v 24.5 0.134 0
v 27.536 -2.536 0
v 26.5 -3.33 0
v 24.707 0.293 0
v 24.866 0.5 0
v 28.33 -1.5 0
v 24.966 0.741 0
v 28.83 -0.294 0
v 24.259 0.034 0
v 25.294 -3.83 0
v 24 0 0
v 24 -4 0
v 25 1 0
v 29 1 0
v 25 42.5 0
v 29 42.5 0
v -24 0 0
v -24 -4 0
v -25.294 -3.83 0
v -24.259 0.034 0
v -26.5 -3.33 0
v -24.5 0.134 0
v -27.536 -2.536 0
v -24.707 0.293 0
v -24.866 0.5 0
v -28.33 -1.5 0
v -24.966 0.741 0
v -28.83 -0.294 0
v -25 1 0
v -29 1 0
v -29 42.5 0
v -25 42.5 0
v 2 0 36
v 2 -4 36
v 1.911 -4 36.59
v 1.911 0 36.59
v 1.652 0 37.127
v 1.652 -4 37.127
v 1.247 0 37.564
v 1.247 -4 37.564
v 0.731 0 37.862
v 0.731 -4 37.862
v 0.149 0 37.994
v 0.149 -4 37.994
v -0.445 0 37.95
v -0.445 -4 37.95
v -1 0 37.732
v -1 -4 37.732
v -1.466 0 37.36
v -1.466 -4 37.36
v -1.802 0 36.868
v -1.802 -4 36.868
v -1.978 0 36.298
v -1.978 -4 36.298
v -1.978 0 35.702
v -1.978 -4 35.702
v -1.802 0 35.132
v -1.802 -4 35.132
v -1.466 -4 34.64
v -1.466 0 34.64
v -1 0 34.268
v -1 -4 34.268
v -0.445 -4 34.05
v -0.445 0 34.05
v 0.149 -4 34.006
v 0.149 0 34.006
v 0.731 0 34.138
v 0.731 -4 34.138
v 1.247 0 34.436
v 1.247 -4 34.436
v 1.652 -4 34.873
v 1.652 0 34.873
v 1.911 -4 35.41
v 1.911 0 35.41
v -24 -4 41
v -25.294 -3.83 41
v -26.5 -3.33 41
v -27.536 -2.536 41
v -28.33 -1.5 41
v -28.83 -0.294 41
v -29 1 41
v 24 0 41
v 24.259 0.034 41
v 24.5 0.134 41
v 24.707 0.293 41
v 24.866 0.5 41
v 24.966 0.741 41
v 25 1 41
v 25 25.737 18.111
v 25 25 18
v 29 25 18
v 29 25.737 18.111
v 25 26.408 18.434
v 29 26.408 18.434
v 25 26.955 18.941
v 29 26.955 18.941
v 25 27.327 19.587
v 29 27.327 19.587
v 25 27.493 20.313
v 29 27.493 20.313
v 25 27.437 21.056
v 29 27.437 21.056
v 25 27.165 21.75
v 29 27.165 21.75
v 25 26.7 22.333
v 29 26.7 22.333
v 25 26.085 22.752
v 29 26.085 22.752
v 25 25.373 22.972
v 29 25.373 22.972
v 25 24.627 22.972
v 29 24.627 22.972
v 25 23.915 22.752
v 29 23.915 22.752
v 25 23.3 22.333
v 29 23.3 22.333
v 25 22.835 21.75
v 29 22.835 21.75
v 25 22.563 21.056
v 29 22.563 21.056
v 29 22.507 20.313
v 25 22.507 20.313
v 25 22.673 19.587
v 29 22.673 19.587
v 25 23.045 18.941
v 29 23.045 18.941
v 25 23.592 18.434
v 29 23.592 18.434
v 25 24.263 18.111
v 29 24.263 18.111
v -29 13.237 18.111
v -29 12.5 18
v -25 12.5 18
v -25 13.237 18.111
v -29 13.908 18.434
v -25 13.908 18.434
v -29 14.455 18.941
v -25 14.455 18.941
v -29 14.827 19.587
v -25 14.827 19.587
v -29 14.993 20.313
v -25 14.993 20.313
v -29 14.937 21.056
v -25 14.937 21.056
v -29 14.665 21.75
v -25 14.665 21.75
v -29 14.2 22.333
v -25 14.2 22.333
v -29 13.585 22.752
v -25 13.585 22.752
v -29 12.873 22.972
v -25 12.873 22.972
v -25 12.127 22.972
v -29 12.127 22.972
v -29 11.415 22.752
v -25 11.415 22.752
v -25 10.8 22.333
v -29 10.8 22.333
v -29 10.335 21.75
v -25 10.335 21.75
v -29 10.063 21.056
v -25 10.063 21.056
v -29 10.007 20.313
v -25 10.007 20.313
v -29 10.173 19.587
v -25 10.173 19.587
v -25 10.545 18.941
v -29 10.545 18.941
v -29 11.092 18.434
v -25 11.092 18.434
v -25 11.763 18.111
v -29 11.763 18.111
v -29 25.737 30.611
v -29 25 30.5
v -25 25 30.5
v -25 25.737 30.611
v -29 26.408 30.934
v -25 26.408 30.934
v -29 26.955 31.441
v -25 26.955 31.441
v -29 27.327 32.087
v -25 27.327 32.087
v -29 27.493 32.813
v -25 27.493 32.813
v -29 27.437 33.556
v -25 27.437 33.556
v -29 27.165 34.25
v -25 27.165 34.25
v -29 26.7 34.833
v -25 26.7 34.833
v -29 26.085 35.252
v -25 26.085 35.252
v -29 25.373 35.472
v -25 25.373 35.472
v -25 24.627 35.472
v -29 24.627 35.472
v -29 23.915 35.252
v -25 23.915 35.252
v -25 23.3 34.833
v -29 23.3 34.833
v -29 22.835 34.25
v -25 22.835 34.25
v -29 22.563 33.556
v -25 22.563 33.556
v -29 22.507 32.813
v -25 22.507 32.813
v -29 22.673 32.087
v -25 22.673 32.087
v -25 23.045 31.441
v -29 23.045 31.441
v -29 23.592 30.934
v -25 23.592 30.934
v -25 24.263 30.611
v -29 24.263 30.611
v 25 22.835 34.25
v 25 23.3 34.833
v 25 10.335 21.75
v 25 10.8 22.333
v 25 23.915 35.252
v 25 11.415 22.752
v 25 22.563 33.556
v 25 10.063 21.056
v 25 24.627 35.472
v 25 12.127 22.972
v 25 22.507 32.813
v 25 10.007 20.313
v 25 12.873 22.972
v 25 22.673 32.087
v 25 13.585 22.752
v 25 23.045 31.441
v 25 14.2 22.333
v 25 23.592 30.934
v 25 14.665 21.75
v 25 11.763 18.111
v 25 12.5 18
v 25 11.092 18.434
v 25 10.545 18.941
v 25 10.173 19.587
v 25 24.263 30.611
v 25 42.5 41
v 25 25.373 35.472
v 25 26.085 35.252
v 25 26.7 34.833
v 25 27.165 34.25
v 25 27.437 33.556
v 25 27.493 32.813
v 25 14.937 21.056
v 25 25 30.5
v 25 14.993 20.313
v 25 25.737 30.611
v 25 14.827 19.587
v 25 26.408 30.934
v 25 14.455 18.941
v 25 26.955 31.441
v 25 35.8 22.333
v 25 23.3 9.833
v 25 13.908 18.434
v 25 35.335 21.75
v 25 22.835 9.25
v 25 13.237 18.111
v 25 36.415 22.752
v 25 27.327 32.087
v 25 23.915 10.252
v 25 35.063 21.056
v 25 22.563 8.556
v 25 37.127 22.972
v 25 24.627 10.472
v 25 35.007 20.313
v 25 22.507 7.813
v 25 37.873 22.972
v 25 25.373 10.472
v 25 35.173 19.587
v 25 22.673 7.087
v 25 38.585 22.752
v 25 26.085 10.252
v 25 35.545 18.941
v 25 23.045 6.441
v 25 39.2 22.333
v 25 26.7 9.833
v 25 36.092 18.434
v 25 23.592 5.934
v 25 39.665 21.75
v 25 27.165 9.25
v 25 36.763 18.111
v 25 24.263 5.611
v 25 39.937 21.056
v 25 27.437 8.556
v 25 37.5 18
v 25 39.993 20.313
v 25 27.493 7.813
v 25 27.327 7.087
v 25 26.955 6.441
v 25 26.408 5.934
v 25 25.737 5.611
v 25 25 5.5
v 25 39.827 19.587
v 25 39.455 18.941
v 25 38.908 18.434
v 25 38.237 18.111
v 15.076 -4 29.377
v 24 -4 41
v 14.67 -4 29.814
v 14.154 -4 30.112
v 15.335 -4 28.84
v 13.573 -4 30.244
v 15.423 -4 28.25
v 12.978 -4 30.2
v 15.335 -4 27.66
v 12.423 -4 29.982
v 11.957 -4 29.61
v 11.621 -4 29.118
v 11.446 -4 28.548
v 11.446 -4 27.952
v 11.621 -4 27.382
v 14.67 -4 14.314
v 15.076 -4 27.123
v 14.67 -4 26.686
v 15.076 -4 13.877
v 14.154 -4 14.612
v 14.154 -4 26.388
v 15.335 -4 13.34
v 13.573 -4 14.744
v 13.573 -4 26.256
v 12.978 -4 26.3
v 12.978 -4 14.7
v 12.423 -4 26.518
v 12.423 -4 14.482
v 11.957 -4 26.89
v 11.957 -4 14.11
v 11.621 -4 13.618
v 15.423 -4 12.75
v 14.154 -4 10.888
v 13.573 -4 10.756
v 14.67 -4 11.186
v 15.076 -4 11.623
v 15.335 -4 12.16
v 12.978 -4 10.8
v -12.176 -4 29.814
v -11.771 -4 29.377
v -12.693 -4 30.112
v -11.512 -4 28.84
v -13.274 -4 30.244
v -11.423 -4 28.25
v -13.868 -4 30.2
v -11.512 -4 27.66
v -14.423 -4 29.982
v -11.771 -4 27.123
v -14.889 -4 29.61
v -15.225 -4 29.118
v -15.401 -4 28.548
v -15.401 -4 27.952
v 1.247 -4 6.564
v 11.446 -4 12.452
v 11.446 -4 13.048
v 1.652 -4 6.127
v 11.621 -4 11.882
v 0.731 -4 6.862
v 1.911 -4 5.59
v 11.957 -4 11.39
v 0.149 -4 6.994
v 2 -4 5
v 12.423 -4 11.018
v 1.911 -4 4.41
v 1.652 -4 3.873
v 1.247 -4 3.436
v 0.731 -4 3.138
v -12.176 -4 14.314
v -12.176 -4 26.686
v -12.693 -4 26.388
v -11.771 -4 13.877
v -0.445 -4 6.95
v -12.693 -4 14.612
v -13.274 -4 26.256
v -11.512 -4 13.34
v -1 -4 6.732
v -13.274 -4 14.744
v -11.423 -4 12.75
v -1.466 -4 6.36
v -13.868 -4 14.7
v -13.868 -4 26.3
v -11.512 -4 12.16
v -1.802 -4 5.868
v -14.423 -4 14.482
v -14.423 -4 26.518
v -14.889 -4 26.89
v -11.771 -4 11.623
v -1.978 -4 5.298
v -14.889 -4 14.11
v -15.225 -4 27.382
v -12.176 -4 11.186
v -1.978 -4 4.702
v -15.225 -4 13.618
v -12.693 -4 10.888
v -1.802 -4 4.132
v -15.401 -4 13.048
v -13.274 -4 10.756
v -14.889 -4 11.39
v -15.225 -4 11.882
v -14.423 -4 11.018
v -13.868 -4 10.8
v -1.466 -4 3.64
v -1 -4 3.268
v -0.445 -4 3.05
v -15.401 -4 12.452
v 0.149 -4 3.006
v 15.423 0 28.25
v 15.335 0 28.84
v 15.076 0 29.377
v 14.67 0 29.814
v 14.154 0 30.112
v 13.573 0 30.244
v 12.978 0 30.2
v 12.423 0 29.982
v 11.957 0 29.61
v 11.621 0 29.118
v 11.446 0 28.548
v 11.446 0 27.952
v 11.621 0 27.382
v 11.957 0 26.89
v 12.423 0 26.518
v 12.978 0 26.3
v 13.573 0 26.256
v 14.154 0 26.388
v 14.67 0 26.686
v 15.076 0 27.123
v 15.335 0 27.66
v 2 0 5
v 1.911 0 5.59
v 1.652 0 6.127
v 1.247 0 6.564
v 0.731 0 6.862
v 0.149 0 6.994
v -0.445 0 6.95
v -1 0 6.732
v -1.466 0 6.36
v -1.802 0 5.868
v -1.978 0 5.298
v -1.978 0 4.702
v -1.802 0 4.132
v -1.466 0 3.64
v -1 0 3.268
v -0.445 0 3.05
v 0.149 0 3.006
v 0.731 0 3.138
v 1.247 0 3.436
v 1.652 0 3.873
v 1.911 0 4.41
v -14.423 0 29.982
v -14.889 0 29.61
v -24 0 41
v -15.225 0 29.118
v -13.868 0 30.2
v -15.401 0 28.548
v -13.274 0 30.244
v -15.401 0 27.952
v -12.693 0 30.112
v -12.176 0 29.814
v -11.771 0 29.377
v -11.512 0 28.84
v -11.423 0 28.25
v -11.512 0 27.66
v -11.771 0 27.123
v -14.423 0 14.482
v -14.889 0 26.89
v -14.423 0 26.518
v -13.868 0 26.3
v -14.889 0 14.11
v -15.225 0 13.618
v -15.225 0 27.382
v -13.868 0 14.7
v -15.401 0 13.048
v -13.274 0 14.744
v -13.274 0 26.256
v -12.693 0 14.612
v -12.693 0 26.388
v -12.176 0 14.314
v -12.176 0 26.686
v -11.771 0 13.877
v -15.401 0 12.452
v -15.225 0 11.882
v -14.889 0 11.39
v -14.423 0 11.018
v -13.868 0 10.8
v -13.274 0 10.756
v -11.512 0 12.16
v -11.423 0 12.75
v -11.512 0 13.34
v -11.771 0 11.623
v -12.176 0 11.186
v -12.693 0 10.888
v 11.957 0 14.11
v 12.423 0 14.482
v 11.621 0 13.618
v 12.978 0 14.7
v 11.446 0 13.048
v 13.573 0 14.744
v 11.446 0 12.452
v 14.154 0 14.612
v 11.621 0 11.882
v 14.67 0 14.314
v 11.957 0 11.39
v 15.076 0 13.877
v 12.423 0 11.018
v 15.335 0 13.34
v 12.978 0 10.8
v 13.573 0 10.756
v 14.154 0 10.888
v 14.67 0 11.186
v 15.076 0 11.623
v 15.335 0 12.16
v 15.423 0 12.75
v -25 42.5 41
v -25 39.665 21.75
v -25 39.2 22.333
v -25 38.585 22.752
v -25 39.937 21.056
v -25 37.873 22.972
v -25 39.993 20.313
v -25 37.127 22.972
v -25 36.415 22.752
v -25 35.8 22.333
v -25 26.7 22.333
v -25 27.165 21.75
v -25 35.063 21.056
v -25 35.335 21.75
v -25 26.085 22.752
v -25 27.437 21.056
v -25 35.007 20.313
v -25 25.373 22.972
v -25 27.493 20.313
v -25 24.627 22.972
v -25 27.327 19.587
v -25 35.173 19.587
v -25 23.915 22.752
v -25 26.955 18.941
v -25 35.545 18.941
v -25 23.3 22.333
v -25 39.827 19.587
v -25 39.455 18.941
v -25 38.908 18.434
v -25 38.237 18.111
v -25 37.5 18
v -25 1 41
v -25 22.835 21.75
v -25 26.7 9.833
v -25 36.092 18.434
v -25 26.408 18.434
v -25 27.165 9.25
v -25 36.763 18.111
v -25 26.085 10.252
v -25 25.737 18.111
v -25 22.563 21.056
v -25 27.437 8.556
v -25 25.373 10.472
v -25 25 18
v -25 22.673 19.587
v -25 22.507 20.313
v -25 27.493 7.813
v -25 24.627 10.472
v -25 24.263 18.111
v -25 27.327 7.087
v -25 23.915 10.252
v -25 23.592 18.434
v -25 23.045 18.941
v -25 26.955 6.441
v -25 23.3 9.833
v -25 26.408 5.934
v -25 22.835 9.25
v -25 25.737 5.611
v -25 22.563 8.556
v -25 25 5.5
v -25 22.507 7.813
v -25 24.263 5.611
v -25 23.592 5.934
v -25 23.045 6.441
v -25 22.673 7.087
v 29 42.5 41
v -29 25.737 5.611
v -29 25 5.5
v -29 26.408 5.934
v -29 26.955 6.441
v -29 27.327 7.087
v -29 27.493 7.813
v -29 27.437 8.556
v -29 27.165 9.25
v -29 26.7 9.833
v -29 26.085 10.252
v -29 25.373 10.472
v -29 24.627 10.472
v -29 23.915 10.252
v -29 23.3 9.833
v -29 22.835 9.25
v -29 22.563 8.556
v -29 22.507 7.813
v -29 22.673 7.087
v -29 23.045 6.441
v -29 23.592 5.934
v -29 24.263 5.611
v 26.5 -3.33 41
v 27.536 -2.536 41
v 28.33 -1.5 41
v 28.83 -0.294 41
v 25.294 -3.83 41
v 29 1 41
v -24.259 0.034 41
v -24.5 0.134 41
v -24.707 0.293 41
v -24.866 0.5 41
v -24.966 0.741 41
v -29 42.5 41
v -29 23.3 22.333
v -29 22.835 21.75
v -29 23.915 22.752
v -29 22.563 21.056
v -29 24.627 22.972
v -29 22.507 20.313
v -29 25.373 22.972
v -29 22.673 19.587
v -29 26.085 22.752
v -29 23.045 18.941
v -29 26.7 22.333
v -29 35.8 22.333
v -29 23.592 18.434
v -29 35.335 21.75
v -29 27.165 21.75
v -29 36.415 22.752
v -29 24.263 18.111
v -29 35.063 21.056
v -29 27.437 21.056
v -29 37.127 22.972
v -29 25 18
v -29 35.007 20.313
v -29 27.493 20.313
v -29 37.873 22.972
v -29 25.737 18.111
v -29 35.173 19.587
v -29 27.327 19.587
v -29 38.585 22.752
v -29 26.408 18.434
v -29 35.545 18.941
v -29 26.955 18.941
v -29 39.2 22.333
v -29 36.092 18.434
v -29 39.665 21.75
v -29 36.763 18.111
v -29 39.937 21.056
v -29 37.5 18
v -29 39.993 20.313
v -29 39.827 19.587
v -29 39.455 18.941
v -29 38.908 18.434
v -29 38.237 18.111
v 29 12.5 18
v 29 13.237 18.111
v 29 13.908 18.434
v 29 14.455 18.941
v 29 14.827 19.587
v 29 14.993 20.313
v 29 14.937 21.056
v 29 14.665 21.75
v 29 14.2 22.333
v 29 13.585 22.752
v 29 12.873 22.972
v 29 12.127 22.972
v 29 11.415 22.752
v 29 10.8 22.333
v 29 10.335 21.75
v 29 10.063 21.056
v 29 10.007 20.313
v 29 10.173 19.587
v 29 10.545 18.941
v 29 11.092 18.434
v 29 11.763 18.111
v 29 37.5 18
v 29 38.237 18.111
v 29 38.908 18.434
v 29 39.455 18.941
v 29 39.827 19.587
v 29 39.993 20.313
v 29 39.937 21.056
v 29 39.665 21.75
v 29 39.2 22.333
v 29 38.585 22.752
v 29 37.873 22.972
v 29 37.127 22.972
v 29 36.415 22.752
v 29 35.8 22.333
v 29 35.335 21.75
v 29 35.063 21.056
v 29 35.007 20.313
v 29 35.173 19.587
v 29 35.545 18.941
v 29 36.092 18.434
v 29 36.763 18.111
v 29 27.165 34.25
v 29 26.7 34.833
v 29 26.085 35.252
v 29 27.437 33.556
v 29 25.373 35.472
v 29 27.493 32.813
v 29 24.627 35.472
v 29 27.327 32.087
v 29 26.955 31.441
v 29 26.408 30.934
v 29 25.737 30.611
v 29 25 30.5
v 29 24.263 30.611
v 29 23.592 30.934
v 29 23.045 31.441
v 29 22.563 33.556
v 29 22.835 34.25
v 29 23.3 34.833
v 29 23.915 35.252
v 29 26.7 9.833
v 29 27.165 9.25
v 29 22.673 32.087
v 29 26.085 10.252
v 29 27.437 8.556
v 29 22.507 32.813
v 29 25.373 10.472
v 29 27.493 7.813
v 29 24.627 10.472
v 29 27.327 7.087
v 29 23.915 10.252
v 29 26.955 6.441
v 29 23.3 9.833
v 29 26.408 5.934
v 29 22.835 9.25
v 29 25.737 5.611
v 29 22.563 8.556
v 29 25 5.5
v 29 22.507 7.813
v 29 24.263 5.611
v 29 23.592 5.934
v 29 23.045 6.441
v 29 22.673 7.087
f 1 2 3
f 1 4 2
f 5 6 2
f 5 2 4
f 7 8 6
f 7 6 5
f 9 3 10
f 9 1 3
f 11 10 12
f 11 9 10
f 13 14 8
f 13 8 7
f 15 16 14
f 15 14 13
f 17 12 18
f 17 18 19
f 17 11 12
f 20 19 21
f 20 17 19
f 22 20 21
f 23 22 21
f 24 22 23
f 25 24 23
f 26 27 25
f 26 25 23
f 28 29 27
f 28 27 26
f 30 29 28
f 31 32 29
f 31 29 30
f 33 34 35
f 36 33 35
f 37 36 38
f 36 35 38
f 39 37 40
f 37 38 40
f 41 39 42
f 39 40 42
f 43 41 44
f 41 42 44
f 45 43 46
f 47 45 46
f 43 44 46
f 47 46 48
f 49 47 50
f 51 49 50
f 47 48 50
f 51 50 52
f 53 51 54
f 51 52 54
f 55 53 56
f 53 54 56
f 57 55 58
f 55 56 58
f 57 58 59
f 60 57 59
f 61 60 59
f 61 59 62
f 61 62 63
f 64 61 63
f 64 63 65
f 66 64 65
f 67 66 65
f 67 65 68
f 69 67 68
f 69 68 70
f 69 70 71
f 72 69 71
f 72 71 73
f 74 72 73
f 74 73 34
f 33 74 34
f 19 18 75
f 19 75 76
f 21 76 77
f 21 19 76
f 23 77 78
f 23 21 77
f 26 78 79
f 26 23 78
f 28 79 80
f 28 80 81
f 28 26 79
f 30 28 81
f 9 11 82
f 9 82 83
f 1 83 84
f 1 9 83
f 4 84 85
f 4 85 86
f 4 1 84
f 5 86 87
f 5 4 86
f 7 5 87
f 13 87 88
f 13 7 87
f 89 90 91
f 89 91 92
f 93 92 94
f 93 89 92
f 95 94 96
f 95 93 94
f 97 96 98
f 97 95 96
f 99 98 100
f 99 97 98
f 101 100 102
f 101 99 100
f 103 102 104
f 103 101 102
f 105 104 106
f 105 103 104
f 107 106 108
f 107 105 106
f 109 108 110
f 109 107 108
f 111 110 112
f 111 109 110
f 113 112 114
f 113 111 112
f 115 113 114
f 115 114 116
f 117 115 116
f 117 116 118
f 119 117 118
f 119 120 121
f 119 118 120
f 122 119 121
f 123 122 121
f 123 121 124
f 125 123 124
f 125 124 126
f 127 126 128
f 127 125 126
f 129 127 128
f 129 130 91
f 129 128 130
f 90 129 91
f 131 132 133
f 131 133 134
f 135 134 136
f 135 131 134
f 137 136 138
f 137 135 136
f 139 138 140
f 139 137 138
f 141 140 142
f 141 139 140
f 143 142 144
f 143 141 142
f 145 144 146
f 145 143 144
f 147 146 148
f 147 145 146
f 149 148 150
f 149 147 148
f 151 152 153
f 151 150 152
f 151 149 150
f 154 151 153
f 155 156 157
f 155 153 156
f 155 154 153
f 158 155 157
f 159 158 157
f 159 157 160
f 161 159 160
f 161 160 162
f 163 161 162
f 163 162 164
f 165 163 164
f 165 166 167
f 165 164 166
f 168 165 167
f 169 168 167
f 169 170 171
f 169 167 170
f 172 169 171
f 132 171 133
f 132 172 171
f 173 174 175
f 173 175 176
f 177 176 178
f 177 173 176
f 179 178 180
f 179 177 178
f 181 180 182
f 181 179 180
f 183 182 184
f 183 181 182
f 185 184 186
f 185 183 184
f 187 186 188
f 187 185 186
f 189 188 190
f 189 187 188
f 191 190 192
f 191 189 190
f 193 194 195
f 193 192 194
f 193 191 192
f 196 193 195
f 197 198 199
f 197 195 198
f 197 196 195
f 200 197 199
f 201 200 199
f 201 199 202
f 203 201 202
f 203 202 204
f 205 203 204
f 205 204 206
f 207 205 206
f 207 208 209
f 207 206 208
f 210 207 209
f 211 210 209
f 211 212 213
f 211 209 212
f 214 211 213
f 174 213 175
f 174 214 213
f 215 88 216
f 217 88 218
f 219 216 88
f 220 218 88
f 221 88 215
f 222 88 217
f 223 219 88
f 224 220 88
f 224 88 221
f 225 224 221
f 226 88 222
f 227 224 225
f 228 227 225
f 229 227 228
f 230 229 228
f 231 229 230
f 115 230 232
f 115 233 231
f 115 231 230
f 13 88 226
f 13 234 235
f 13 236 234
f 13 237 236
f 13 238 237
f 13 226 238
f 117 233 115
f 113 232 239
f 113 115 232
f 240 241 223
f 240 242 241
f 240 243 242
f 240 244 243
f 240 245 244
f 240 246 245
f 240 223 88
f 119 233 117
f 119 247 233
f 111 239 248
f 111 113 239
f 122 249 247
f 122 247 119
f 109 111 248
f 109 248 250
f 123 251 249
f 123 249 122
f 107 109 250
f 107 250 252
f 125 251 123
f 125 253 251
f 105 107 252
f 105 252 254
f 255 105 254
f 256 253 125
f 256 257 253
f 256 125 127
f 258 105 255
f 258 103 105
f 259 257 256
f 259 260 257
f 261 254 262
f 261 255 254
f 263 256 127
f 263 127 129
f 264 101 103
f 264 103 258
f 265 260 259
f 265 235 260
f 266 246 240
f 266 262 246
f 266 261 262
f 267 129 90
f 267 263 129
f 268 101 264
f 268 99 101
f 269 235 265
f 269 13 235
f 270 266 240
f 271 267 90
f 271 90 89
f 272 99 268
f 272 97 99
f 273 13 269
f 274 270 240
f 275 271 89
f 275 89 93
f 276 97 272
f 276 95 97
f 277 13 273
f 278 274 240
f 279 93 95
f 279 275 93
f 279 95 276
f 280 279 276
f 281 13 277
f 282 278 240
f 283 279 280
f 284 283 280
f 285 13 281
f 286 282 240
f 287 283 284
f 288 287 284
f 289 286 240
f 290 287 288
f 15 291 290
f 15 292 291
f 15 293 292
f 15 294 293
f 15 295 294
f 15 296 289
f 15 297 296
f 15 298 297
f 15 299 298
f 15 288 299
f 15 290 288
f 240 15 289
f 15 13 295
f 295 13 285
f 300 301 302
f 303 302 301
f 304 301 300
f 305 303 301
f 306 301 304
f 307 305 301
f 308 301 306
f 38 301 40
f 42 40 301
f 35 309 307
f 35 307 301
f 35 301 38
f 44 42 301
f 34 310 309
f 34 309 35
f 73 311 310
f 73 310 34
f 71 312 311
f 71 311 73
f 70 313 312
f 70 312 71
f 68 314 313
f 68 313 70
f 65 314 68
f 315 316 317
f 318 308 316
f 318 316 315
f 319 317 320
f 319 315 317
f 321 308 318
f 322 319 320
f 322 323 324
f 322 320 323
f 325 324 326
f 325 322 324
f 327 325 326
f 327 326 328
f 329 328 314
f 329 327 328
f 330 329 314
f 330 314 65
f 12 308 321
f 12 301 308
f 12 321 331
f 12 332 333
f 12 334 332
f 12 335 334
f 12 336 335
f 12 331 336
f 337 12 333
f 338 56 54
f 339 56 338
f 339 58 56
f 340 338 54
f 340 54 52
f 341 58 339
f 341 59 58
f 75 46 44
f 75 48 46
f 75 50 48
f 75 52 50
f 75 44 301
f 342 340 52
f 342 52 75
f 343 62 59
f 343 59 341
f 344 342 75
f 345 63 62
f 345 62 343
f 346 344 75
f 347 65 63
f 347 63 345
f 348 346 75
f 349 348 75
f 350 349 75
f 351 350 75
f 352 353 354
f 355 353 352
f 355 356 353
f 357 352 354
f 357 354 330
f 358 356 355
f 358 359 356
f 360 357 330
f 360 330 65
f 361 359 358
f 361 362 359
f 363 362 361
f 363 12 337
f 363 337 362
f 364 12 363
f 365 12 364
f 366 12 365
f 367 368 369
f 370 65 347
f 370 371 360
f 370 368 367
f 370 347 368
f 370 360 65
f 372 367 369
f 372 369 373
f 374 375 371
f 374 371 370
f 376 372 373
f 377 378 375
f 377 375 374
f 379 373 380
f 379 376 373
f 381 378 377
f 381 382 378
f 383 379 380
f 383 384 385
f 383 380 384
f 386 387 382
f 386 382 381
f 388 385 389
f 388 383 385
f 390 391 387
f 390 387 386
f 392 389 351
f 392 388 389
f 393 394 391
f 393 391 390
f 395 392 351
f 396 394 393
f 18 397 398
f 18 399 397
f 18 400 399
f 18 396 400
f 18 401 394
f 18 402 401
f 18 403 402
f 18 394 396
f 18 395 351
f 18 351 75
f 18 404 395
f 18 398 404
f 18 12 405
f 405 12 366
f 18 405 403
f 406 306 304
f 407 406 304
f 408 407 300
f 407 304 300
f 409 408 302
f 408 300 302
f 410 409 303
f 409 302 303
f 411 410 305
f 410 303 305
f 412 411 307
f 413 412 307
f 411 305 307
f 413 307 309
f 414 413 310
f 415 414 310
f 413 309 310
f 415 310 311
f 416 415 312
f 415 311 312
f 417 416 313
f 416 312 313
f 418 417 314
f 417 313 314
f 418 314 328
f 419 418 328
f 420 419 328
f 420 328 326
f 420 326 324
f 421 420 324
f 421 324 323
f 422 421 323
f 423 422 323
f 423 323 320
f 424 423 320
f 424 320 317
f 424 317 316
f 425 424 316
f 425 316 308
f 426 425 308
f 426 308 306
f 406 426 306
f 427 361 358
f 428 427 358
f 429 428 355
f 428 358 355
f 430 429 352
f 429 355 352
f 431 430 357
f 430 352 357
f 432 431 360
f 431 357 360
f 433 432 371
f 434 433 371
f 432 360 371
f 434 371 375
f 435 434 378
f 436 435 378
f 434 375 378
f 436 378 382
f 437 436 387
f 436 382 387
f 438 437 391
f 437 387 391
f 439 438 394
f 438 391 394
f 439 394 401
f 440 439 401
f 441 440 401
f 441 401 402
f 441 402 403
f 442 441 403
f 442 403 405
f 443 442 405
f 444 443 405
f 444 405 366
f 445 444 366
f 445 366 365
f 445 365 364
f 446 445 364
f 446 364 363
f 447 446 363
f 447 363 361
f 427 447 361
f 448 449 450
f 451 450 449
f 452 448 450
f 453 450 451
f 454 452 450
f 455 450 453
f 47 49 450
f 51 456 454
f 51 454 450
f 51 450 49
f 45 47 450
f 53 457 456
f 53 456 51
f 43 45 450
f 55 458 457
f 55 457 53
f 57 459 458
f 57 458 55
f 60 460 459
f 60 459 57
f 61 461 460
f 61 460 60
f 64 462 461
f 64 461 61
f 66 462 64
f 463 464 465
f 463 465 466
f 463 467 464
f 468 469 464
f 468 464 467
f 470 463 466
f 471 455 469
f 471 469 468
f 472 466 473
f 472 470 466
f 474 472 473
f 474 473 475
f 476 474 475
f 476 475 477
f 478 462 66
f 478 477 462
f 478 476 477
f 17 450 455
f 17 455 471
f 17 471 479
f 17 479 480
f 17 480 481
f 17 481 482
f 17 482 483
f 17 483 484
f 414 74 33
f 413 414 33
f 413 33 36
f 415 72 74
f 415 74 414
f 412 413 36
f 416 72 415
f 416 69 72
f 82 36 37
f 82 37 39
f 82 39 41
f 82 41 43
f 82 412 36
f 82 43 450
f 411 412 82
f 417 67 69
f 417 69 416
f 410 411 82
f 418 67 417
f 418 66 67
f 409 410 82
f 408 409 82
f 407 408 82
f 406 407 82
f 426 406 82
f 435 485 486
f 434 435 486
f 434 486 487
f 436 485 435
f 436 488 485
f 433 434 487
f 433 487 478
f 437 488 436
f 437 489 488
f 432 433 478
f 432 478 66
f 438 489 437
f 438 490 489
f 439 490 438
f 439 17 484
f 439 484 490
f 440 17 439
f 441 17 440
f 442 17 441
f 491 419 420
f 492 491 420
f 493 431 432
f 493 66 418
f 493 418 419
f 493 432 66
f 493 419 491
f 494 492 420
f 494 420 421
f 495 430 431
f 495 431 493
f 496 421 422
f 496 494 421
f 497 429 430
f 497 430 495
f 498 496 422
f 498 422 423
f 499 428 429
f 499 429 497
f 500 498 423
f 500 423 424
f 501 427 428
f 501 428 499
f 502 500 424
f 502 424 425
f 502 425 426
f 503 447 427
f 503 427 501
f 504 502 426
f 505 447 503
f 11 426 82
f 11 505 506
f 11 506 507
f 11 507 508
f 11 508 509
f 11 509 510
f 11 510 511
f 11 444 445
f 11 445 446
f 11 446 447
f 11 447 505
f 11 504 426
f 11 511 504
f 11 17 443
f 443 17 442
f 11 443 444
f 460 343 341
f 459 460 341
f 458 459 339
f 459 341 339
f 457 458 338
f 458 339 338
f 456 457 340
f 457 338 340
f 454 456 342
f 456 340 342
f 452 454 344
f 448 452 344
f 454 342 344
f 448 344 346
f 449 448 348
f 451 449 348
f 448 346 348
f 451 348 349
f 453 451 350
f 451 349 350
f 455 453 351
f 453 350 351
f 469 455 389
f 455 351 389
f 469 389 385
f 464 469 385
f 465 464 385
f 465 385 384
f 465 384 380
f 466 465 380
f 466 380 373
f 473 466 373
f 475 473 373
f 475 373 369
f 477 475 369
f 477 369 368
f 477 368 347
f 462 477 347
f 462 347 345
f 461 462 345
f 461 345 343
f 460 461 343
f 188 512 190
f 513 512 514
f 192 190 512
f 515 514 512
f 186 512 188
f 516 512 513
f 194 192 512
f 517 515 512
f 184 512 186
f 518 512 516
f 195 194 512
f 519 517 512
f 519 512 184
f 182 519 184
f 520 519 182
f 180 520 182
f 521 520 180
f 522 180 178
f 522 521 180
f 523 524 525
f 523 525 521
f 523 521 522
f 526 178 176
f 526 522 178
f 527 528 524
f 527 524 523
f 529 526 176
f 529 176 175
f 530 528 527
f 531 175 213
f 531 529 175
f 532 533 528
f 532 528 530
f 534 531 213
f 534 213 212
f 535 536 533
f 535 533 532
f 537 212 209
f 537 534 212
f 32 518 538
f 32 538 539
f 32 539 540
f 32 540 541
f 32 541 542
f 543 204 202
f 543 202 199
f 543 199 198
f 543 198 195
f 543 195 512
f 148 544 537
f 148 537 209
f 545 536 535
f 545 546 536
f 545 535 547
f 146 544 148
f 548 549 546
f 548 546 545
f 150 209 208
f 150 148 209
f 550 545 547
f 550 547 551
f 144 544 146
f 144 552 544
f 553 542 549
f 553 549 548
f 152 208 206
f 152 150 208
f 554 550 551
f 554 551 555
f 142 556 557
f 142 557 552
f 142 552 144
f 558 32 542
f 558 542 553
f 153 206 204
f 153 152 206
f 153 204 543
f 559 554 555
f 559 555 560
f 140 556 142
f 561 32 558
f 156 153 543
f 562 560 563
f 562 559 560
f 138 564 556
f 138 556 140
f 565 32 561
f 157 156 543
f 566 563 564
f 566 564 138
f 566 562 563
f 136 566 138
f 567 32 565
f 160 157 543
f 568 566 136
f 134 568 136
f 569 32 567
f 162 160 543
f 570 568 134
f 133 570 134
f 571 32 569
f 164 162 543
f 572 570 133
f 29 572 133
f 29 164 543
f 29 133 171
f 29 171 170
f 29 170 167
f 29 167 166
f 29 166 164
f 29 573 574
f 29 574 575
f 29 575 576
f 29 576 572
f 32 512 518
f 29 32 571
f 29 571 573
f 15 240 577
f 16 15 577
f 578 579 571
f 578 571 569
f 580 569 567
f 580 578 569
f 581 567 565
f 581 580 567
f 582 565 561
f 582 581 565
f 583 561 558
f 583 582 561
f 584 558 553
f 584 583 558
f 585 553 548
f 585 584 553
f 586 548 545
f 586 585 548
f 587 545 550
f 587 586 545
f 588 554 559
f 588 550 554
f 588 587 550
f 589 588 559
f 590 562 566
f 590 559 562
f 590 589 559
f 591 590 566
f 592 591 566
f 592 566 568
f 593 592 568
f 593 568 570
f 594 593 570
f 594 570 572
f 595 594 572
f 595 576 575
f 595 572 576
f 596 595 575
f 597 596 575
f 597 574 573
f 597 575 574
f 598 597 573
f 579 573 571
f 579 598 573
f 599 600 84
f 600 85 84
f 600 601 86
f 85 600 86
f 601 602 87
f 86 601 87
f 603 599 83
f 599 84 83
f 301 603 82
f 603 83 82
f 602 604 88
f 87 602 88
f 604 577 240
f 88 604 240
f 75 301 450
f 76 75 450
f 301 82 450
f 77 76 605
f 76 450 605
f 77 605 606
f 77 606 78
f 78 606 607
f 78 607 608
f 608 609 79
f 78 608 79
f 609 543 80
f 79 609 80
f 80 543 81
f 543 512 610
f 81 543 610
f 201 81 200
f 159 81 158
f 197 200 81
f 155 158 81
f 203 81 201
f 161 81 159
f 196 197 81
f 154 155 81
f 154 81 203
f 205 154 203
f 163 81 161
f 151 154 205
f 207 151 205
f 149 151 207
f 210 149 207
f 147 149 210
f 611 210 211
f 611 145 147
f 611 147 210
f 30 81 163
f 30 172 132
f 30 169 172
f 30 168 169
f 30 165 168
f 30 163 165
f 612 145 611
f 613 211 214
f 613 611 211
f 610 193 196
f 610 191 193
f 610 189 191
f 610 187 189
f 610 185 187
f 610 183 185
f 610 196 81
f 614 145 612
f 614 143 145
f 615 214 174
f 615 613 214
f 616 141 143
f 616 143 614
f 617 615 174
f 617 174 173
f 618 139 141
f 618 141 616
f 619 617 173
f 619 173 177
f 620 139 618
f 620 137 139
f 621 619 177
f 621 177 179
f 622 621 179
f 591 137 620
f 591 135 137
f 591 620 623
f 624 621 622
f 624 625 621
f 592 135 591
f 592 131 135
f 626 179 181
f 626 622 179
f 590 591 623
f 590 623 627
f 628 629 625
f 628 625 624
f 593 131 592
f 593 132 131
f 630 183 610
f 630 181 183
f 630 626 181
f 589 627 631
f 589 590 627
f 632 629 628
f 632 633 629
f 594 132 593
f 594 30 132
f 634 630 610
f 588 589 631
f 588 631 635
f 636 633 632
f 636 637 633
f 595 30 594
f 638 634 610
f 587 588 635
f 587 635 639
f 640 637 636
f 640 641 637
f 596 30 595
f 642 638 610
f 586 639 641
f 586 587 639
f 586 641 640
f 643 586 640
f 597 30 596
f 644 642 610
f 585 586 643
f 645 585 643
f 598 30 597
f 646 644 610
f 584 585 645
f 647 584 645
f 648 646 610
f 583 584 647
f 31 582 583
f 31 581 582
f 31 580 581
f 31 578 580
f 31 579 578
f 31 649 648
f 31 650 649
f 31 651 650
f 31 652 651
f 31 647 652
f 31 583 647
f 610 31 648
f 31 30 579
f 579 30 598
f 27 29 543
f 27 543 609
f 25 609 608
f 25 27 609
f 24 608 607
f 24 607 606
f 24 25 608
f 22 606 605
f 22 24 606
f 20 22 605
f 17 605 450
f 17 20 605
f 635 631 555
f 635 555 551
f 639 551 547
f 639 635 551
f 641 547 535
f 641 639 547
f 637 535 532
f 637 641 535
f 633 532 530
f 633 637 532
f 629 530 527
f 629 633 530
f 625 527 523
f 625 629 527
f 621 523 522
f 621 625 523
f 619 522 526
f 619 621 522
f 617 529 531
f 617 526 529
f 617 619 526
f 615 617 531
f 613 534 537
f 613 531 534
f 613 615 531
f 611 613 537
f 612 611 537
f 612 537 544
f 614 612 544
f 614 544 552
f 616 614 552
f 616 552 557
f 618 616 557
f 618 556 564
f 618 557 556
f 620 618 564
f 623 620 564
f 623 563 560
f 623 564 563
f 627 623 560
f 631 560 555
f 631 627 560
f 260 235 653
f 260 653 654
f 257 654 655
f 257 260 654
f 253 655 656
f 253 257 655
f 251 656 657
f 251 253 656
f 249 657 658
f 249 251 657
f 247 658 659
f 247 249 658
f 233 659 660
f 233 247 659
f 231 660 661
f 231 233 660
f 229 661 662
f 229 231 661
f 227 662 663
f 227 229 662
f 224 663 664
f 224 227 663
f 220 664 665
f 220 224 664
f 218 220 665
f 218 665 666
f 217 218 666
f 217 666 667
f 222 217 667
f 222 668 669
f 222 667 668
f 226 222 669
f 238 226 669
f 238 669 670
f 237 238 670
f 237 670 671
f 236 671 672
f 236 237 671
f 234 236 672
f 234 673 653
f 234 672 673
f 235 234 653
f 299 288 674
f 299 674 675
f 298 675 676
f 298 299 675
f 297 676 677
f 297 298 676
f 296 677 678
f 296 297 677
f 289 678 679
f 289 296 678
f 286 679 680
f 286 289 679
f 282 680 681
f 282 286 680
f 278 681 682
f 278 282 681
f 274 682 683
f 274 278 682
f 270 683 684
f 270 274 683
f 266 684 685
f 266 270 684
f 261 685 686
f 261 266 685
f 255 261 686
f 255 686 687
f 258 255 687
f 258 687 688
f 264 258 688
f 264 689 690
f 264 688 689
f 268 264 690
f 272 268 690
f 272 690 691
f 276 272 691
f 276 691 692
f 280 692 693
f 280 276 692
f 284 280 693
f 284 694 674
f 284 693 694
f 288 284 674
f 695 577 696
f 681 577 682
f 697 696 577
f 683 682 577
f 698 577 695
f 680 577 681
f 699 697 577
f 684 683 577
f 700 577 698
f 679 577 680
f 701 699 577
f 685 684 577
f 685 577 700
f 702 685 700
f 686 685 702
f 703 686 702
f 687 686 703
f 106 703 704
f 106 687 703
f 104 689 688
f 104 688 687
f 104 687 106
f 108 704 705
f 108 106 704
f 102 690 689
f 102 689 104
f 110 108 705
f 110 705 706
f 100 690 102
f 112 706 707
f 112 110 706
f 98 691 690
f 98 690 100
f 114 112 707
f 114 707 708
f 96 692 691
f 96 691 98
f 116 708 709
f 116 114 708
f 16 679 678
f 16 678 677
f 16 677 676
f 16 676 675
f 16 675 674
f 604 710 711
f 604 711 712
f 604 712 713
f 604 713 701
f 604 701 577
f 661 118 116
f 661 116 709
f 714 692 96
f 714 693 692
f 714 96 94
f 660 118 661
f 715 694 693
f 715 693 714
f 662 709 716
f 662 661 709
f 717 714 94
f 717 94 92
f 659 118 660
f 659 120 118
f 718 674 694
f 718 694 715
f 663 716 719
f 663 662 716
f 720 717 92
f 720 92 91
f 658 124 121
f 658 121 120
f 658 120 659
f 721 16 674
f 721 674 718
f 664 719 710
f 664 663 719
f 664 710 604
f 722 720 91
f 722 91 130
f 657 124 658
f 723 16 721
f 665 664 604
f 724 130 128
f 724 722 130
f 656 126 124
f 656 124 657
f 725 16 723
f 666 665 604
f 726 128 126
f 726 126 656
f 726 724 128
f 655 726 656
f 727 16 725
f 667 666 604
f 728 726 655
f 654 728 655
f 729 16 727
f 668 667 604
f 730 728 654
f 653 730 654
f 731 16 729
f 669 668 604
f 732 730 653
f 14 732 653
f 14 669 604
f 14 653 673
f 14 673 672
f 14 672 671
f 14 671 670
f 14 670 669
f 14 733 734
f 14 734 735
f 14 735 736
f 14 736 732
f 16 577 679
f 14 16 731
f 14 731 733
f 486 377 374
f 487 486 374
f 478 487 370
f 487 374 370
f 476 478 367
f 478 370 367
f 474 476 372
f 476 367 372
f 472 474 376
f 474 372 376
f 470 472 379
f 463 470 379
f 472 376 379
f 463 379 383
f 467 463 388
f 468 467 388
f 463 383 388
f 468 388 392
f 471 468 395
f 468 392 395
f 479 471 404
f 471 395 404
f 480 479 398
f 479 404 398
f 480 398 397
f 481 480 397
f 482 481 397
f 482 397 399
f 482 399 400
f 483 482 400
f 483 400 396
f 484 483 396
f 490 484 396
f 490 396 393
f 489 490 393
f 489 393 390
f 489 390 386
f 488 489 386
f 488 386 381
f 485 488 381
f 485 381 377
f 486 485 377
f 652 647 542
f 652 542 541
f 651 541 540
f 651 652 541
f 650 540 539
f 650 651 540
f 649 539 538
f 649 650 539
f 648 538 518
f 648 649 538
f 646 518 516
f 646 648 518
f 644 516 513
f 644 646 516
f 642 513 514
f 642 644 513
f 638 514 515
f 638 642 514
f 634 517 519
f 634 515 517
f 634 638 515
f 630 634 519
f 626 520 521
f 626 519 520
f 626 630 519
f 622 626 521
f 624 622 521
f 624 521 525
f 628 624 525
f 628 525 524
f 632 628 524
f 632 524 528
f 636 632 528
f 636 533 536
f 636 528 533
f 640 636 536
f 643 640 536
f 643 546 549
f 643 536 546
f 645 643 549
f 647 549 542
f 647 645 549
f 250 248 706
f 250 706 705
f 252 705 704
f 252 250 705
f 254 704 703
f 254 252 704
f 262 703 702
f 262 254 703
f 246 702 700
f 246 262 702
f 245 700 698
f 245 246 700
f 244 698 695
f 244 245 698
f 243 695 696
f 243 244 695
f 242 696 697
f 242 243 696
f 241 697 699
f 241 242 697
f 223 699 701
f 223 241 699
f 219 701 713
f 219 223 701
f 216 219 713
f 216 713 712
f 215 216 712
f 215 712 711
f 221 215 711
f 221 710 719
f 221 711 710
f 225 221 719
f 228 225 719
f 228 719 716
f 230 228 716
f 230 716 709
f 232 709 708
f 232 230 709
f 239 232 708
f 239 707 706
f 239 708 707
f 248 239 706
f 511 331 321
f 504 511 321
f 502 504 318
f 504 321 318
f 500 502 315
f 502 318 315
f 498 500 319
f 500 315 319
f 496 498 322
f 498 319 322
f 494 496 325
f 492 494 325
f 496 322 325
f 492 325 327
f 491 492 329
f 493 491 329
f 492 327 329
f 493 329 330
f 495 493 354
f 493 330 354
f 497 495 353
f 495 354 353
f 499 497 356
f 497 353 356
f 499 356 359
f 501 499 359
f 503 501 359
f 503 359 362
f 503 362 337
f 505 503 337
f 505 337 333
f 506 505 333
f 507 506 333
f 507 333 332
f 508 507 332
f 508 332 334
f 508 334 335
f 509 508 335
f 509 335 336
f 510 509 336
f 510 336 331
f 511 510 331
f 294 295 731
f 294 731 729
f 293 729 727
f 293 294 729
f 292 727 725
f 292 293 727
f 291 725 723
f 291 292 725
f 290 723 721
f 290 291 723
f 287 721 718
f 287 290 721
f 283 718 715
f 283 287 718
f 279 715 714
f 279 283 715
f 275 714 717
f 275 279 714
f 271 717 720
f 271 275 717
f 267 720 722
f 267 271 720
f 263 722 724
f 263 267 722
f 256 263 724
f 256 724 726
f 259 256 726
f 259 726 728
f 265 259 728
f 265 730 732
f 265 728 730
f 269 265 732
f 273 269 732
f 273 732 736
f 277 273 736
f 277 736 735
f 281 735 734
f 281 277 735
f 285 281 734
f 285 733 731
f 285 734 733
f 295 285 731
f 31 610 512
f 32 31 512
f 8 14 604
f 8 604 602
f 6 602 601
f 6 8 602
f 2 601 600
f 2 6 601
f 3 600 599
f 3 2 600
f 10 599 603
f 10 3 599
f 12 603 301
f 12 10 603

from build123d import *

# Parameters (mm, degrees)
SM_BASE_FLANGE_1_DEPTH   = 41
SKETCH_9_R               = 2
CUT_EXTRUDE_4_DEPTH      = 69.441580929
CUT_EXTRUDE_5_DEPTH      = 83.772277968
CUT_EXTRUDE_5_DEPTH_BACK = 83.772277968
SKETCH_10_R              = 2.5


# Sheet-metal steps are written as plain solids
with BuildPart() as part:
    # Sketch 1 → Базовая кромка1 (new body)
    with BuildSketch(Plane.XY):
        with BuildLine():
            Line((-25, 42.5), (-25, 1))
            ThreePointArc((-25, 1), (-24.707106781, 0.292893219), (-24, 0))
            Line((-24, 0), (24, 0))
            ThreePointArc((24, 0), (24.707106781, 0.292893219), (25, 1))
            Line((25, 1), (25, 42.5))
            Line((25, 42.5), (29, 42.5))
            Line((29, 42.5), (29, 1))
            ThreePointArc((29, 1), (27.535533906, -2.535533906), (24, -4))
            Line((24, -4), (-24, -4))
            ThreePointArc((-24, -4), (-27.535533906, -2.535533906), (-29, 1))
            Line((-29, 1), (-29, 42.5))
            Line((-29, 42.5), (-25, 42.5))
        make_face()
    extrude(amount=SM_BASE_FLANGE_1_DEPTH)

    # Эскиз9 → Вырез-Вытянуть4 (cut, through all)
    with BuildSketch(Plane.XZ.offset(4)):
        with Locations((0, 5)):
            Circle(SKETCH_9_R)
        with Locations((-13.423393759, 12.75)):
            Circle(SKETCH_9_R)
        with Locations((-13.423393759, 28.25)):
            Circle(SKETCH_9_R)
        with Locations((0, 36)):
            Circle(SKETCH_9_R)
        with Locations((13.423393759, 28.25)):
            Circle(SKETCH_9_R)
        with Locations((13.423393759, 12.75)):
            Circle(SKETCH_9_R)
    extrude(amount=-CUT_EXTRUDE_4_DEPTH, mode=Mode.SUBTRACT)

    # Эскиз10 → Вырез-Вытянуть5 (cut, two sides: drawn at the far end of the back side and taken through both)
    with BuildSketch(Plane(origin=(29, 0, 0), x_dir=(0, 0, -1), z_dir=(1, 0, 0)).offset(-CUT_EXTRUDE_5_DEPTH_BACK)):
        with Locations((-33, 25)):
            Circle(SKETCH_10_R)
        with Locations((-20.5, 25)):
            Circle(SKETCH_10_R)
        with Locations((-8, 25)):
            Circle(SKETCH_10_R)
        with Locations((-20.5, 12.5)):
            Circle(SKETCH_10_R)
        with Locations((-20.5, 37.5)):
            Circle(SKETCH_10_R)
    extrude(amount=CUT_EXTRUDE_5_DEPTH + CUT_EXTRUDE_5_DEPTH_BACK, mode=Mode.SUBTRACT)


solid = part.part
